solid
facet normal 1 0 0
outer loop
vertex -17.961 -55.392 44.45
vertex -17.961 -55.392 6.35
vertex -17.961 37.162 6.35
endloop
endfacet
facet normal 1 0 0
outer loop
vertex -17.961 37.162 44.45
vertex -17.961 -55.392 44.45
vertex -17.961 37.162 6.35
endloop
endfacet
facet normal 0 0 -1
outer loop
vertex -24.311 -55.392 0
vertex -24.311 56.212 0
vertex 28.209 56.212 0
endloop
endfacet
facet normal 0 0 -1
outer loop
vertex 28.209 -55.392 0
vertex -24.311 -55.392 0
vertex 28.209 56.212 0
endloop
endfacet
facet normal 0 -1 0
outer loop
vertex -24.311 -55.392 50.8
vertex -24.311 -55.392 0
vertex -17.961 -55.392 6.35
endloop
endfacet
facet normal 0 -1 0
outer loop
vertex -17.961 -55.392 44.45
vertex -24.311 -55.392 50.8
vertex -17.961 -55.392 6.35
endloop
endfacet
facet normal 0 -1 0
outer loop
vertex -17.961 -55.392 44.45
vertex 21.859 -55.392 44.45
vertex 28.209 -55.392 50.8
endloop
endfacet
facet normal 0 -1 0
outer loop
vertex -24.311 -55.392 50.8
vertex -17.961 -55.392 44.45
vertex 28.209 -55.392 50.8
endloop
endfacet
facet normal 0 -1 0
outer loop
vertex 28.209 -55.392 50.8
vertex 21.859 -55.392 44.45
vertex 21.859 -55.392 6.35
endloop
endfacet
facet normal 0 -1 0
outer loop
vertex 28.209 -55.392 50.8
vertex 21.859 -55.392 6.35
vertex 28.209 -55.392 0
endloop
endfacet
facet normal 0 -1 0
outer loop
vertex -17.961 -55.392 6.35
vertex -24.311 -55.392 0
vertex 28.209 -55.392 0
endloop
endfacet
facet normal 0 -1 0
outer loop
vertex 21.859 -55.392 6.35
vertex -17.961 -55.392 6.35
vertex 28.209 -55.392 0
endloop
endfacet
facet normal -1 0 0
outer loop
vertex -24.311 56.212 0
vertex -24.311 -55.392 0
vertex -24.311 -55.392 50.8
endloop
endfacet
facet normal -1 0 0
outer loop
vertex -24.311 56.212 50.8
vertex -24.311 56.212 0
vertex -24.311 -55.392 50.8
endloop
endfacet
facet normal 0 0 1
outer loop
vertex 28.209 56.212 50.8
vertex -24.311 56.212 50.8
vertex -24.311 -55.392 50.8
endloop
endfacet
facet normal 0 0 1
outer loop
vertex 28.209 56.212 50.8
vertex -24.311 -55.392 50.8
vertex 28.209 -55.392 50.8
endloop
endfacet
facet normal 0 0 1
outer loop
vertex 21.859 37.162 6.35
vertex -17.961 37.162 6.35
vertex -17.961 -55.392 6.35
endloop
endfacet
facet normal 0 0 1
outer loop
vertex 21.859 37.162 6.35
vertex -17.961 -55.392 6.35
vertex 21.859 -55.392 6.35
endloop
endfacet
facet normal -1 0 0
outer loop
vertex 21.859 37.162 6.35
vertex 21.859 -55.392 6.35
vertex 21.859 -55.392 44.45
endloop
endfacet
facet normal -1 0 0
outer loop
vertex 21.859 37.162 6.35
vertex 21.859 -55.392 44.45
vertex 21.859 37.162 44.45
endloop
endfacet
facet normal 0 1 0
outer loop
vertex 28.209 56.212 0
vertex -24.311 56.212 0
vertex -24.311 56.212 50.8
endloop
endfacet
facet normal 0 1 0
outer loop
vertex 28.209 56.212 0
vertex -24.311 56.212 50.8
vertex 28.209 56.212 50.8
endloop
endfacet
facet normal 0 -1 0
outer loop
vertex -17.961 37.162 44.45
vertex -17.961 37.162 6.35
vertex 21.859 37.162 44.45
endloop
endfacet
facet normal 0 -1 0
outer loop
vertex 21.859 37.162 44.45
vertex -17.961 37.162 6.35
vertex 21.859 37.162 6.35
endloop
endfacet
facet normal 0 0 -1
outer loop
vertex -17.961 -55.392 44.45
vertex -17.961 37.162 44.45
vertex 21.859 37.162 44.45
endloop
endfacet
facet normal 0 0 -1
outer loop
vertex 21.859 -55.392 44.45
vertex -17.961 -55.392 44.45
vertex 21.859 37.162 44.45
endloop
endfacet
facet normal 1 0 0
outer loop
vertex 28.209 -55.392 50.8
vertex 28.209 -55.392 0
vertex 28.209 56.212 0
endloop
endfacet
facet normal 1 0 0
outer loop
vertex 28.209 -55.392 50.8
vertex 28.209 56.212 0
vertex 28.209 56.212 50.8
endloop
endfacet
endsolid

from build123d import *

# Parameters (mm, degrees)
F0_W     = 52.5193866342
F0_H     = 111.6036958992
F1_DEPTH = 50.8
F2_T     = -6.35
F3_DEPTH = 12.7


with BuildPart() as f1:
    # F0 (on Top) → F1 (new body)
    with BuildSketch(Plane.XY):
        with Locations((1.9489629194, 0.4103090614)):
            Rectangle(F0_W, F0_H)
    extrude(amount=F1_DEPTH)

    # F2
    f2_openings = [f1.faces().sort_by_distance(p)[0] for p in [
        (1.948963, -55.391539, 25.4),
    ]]
    offset(amount=F2_T, openings=f2_openings)

    # F3 (add): faces of the model
    f3_faces = [f1.faces().sort_by_distance(p)[0] for p in [
        (1.9489629194, 56.212157011, 25.4),
        (1.9489629194, 49.862157011, 25.4),
    ]]
    extrude(f3_faces, amount=-F3_DEPTH, dir=(0, 1, 0))


solid = f1.part
